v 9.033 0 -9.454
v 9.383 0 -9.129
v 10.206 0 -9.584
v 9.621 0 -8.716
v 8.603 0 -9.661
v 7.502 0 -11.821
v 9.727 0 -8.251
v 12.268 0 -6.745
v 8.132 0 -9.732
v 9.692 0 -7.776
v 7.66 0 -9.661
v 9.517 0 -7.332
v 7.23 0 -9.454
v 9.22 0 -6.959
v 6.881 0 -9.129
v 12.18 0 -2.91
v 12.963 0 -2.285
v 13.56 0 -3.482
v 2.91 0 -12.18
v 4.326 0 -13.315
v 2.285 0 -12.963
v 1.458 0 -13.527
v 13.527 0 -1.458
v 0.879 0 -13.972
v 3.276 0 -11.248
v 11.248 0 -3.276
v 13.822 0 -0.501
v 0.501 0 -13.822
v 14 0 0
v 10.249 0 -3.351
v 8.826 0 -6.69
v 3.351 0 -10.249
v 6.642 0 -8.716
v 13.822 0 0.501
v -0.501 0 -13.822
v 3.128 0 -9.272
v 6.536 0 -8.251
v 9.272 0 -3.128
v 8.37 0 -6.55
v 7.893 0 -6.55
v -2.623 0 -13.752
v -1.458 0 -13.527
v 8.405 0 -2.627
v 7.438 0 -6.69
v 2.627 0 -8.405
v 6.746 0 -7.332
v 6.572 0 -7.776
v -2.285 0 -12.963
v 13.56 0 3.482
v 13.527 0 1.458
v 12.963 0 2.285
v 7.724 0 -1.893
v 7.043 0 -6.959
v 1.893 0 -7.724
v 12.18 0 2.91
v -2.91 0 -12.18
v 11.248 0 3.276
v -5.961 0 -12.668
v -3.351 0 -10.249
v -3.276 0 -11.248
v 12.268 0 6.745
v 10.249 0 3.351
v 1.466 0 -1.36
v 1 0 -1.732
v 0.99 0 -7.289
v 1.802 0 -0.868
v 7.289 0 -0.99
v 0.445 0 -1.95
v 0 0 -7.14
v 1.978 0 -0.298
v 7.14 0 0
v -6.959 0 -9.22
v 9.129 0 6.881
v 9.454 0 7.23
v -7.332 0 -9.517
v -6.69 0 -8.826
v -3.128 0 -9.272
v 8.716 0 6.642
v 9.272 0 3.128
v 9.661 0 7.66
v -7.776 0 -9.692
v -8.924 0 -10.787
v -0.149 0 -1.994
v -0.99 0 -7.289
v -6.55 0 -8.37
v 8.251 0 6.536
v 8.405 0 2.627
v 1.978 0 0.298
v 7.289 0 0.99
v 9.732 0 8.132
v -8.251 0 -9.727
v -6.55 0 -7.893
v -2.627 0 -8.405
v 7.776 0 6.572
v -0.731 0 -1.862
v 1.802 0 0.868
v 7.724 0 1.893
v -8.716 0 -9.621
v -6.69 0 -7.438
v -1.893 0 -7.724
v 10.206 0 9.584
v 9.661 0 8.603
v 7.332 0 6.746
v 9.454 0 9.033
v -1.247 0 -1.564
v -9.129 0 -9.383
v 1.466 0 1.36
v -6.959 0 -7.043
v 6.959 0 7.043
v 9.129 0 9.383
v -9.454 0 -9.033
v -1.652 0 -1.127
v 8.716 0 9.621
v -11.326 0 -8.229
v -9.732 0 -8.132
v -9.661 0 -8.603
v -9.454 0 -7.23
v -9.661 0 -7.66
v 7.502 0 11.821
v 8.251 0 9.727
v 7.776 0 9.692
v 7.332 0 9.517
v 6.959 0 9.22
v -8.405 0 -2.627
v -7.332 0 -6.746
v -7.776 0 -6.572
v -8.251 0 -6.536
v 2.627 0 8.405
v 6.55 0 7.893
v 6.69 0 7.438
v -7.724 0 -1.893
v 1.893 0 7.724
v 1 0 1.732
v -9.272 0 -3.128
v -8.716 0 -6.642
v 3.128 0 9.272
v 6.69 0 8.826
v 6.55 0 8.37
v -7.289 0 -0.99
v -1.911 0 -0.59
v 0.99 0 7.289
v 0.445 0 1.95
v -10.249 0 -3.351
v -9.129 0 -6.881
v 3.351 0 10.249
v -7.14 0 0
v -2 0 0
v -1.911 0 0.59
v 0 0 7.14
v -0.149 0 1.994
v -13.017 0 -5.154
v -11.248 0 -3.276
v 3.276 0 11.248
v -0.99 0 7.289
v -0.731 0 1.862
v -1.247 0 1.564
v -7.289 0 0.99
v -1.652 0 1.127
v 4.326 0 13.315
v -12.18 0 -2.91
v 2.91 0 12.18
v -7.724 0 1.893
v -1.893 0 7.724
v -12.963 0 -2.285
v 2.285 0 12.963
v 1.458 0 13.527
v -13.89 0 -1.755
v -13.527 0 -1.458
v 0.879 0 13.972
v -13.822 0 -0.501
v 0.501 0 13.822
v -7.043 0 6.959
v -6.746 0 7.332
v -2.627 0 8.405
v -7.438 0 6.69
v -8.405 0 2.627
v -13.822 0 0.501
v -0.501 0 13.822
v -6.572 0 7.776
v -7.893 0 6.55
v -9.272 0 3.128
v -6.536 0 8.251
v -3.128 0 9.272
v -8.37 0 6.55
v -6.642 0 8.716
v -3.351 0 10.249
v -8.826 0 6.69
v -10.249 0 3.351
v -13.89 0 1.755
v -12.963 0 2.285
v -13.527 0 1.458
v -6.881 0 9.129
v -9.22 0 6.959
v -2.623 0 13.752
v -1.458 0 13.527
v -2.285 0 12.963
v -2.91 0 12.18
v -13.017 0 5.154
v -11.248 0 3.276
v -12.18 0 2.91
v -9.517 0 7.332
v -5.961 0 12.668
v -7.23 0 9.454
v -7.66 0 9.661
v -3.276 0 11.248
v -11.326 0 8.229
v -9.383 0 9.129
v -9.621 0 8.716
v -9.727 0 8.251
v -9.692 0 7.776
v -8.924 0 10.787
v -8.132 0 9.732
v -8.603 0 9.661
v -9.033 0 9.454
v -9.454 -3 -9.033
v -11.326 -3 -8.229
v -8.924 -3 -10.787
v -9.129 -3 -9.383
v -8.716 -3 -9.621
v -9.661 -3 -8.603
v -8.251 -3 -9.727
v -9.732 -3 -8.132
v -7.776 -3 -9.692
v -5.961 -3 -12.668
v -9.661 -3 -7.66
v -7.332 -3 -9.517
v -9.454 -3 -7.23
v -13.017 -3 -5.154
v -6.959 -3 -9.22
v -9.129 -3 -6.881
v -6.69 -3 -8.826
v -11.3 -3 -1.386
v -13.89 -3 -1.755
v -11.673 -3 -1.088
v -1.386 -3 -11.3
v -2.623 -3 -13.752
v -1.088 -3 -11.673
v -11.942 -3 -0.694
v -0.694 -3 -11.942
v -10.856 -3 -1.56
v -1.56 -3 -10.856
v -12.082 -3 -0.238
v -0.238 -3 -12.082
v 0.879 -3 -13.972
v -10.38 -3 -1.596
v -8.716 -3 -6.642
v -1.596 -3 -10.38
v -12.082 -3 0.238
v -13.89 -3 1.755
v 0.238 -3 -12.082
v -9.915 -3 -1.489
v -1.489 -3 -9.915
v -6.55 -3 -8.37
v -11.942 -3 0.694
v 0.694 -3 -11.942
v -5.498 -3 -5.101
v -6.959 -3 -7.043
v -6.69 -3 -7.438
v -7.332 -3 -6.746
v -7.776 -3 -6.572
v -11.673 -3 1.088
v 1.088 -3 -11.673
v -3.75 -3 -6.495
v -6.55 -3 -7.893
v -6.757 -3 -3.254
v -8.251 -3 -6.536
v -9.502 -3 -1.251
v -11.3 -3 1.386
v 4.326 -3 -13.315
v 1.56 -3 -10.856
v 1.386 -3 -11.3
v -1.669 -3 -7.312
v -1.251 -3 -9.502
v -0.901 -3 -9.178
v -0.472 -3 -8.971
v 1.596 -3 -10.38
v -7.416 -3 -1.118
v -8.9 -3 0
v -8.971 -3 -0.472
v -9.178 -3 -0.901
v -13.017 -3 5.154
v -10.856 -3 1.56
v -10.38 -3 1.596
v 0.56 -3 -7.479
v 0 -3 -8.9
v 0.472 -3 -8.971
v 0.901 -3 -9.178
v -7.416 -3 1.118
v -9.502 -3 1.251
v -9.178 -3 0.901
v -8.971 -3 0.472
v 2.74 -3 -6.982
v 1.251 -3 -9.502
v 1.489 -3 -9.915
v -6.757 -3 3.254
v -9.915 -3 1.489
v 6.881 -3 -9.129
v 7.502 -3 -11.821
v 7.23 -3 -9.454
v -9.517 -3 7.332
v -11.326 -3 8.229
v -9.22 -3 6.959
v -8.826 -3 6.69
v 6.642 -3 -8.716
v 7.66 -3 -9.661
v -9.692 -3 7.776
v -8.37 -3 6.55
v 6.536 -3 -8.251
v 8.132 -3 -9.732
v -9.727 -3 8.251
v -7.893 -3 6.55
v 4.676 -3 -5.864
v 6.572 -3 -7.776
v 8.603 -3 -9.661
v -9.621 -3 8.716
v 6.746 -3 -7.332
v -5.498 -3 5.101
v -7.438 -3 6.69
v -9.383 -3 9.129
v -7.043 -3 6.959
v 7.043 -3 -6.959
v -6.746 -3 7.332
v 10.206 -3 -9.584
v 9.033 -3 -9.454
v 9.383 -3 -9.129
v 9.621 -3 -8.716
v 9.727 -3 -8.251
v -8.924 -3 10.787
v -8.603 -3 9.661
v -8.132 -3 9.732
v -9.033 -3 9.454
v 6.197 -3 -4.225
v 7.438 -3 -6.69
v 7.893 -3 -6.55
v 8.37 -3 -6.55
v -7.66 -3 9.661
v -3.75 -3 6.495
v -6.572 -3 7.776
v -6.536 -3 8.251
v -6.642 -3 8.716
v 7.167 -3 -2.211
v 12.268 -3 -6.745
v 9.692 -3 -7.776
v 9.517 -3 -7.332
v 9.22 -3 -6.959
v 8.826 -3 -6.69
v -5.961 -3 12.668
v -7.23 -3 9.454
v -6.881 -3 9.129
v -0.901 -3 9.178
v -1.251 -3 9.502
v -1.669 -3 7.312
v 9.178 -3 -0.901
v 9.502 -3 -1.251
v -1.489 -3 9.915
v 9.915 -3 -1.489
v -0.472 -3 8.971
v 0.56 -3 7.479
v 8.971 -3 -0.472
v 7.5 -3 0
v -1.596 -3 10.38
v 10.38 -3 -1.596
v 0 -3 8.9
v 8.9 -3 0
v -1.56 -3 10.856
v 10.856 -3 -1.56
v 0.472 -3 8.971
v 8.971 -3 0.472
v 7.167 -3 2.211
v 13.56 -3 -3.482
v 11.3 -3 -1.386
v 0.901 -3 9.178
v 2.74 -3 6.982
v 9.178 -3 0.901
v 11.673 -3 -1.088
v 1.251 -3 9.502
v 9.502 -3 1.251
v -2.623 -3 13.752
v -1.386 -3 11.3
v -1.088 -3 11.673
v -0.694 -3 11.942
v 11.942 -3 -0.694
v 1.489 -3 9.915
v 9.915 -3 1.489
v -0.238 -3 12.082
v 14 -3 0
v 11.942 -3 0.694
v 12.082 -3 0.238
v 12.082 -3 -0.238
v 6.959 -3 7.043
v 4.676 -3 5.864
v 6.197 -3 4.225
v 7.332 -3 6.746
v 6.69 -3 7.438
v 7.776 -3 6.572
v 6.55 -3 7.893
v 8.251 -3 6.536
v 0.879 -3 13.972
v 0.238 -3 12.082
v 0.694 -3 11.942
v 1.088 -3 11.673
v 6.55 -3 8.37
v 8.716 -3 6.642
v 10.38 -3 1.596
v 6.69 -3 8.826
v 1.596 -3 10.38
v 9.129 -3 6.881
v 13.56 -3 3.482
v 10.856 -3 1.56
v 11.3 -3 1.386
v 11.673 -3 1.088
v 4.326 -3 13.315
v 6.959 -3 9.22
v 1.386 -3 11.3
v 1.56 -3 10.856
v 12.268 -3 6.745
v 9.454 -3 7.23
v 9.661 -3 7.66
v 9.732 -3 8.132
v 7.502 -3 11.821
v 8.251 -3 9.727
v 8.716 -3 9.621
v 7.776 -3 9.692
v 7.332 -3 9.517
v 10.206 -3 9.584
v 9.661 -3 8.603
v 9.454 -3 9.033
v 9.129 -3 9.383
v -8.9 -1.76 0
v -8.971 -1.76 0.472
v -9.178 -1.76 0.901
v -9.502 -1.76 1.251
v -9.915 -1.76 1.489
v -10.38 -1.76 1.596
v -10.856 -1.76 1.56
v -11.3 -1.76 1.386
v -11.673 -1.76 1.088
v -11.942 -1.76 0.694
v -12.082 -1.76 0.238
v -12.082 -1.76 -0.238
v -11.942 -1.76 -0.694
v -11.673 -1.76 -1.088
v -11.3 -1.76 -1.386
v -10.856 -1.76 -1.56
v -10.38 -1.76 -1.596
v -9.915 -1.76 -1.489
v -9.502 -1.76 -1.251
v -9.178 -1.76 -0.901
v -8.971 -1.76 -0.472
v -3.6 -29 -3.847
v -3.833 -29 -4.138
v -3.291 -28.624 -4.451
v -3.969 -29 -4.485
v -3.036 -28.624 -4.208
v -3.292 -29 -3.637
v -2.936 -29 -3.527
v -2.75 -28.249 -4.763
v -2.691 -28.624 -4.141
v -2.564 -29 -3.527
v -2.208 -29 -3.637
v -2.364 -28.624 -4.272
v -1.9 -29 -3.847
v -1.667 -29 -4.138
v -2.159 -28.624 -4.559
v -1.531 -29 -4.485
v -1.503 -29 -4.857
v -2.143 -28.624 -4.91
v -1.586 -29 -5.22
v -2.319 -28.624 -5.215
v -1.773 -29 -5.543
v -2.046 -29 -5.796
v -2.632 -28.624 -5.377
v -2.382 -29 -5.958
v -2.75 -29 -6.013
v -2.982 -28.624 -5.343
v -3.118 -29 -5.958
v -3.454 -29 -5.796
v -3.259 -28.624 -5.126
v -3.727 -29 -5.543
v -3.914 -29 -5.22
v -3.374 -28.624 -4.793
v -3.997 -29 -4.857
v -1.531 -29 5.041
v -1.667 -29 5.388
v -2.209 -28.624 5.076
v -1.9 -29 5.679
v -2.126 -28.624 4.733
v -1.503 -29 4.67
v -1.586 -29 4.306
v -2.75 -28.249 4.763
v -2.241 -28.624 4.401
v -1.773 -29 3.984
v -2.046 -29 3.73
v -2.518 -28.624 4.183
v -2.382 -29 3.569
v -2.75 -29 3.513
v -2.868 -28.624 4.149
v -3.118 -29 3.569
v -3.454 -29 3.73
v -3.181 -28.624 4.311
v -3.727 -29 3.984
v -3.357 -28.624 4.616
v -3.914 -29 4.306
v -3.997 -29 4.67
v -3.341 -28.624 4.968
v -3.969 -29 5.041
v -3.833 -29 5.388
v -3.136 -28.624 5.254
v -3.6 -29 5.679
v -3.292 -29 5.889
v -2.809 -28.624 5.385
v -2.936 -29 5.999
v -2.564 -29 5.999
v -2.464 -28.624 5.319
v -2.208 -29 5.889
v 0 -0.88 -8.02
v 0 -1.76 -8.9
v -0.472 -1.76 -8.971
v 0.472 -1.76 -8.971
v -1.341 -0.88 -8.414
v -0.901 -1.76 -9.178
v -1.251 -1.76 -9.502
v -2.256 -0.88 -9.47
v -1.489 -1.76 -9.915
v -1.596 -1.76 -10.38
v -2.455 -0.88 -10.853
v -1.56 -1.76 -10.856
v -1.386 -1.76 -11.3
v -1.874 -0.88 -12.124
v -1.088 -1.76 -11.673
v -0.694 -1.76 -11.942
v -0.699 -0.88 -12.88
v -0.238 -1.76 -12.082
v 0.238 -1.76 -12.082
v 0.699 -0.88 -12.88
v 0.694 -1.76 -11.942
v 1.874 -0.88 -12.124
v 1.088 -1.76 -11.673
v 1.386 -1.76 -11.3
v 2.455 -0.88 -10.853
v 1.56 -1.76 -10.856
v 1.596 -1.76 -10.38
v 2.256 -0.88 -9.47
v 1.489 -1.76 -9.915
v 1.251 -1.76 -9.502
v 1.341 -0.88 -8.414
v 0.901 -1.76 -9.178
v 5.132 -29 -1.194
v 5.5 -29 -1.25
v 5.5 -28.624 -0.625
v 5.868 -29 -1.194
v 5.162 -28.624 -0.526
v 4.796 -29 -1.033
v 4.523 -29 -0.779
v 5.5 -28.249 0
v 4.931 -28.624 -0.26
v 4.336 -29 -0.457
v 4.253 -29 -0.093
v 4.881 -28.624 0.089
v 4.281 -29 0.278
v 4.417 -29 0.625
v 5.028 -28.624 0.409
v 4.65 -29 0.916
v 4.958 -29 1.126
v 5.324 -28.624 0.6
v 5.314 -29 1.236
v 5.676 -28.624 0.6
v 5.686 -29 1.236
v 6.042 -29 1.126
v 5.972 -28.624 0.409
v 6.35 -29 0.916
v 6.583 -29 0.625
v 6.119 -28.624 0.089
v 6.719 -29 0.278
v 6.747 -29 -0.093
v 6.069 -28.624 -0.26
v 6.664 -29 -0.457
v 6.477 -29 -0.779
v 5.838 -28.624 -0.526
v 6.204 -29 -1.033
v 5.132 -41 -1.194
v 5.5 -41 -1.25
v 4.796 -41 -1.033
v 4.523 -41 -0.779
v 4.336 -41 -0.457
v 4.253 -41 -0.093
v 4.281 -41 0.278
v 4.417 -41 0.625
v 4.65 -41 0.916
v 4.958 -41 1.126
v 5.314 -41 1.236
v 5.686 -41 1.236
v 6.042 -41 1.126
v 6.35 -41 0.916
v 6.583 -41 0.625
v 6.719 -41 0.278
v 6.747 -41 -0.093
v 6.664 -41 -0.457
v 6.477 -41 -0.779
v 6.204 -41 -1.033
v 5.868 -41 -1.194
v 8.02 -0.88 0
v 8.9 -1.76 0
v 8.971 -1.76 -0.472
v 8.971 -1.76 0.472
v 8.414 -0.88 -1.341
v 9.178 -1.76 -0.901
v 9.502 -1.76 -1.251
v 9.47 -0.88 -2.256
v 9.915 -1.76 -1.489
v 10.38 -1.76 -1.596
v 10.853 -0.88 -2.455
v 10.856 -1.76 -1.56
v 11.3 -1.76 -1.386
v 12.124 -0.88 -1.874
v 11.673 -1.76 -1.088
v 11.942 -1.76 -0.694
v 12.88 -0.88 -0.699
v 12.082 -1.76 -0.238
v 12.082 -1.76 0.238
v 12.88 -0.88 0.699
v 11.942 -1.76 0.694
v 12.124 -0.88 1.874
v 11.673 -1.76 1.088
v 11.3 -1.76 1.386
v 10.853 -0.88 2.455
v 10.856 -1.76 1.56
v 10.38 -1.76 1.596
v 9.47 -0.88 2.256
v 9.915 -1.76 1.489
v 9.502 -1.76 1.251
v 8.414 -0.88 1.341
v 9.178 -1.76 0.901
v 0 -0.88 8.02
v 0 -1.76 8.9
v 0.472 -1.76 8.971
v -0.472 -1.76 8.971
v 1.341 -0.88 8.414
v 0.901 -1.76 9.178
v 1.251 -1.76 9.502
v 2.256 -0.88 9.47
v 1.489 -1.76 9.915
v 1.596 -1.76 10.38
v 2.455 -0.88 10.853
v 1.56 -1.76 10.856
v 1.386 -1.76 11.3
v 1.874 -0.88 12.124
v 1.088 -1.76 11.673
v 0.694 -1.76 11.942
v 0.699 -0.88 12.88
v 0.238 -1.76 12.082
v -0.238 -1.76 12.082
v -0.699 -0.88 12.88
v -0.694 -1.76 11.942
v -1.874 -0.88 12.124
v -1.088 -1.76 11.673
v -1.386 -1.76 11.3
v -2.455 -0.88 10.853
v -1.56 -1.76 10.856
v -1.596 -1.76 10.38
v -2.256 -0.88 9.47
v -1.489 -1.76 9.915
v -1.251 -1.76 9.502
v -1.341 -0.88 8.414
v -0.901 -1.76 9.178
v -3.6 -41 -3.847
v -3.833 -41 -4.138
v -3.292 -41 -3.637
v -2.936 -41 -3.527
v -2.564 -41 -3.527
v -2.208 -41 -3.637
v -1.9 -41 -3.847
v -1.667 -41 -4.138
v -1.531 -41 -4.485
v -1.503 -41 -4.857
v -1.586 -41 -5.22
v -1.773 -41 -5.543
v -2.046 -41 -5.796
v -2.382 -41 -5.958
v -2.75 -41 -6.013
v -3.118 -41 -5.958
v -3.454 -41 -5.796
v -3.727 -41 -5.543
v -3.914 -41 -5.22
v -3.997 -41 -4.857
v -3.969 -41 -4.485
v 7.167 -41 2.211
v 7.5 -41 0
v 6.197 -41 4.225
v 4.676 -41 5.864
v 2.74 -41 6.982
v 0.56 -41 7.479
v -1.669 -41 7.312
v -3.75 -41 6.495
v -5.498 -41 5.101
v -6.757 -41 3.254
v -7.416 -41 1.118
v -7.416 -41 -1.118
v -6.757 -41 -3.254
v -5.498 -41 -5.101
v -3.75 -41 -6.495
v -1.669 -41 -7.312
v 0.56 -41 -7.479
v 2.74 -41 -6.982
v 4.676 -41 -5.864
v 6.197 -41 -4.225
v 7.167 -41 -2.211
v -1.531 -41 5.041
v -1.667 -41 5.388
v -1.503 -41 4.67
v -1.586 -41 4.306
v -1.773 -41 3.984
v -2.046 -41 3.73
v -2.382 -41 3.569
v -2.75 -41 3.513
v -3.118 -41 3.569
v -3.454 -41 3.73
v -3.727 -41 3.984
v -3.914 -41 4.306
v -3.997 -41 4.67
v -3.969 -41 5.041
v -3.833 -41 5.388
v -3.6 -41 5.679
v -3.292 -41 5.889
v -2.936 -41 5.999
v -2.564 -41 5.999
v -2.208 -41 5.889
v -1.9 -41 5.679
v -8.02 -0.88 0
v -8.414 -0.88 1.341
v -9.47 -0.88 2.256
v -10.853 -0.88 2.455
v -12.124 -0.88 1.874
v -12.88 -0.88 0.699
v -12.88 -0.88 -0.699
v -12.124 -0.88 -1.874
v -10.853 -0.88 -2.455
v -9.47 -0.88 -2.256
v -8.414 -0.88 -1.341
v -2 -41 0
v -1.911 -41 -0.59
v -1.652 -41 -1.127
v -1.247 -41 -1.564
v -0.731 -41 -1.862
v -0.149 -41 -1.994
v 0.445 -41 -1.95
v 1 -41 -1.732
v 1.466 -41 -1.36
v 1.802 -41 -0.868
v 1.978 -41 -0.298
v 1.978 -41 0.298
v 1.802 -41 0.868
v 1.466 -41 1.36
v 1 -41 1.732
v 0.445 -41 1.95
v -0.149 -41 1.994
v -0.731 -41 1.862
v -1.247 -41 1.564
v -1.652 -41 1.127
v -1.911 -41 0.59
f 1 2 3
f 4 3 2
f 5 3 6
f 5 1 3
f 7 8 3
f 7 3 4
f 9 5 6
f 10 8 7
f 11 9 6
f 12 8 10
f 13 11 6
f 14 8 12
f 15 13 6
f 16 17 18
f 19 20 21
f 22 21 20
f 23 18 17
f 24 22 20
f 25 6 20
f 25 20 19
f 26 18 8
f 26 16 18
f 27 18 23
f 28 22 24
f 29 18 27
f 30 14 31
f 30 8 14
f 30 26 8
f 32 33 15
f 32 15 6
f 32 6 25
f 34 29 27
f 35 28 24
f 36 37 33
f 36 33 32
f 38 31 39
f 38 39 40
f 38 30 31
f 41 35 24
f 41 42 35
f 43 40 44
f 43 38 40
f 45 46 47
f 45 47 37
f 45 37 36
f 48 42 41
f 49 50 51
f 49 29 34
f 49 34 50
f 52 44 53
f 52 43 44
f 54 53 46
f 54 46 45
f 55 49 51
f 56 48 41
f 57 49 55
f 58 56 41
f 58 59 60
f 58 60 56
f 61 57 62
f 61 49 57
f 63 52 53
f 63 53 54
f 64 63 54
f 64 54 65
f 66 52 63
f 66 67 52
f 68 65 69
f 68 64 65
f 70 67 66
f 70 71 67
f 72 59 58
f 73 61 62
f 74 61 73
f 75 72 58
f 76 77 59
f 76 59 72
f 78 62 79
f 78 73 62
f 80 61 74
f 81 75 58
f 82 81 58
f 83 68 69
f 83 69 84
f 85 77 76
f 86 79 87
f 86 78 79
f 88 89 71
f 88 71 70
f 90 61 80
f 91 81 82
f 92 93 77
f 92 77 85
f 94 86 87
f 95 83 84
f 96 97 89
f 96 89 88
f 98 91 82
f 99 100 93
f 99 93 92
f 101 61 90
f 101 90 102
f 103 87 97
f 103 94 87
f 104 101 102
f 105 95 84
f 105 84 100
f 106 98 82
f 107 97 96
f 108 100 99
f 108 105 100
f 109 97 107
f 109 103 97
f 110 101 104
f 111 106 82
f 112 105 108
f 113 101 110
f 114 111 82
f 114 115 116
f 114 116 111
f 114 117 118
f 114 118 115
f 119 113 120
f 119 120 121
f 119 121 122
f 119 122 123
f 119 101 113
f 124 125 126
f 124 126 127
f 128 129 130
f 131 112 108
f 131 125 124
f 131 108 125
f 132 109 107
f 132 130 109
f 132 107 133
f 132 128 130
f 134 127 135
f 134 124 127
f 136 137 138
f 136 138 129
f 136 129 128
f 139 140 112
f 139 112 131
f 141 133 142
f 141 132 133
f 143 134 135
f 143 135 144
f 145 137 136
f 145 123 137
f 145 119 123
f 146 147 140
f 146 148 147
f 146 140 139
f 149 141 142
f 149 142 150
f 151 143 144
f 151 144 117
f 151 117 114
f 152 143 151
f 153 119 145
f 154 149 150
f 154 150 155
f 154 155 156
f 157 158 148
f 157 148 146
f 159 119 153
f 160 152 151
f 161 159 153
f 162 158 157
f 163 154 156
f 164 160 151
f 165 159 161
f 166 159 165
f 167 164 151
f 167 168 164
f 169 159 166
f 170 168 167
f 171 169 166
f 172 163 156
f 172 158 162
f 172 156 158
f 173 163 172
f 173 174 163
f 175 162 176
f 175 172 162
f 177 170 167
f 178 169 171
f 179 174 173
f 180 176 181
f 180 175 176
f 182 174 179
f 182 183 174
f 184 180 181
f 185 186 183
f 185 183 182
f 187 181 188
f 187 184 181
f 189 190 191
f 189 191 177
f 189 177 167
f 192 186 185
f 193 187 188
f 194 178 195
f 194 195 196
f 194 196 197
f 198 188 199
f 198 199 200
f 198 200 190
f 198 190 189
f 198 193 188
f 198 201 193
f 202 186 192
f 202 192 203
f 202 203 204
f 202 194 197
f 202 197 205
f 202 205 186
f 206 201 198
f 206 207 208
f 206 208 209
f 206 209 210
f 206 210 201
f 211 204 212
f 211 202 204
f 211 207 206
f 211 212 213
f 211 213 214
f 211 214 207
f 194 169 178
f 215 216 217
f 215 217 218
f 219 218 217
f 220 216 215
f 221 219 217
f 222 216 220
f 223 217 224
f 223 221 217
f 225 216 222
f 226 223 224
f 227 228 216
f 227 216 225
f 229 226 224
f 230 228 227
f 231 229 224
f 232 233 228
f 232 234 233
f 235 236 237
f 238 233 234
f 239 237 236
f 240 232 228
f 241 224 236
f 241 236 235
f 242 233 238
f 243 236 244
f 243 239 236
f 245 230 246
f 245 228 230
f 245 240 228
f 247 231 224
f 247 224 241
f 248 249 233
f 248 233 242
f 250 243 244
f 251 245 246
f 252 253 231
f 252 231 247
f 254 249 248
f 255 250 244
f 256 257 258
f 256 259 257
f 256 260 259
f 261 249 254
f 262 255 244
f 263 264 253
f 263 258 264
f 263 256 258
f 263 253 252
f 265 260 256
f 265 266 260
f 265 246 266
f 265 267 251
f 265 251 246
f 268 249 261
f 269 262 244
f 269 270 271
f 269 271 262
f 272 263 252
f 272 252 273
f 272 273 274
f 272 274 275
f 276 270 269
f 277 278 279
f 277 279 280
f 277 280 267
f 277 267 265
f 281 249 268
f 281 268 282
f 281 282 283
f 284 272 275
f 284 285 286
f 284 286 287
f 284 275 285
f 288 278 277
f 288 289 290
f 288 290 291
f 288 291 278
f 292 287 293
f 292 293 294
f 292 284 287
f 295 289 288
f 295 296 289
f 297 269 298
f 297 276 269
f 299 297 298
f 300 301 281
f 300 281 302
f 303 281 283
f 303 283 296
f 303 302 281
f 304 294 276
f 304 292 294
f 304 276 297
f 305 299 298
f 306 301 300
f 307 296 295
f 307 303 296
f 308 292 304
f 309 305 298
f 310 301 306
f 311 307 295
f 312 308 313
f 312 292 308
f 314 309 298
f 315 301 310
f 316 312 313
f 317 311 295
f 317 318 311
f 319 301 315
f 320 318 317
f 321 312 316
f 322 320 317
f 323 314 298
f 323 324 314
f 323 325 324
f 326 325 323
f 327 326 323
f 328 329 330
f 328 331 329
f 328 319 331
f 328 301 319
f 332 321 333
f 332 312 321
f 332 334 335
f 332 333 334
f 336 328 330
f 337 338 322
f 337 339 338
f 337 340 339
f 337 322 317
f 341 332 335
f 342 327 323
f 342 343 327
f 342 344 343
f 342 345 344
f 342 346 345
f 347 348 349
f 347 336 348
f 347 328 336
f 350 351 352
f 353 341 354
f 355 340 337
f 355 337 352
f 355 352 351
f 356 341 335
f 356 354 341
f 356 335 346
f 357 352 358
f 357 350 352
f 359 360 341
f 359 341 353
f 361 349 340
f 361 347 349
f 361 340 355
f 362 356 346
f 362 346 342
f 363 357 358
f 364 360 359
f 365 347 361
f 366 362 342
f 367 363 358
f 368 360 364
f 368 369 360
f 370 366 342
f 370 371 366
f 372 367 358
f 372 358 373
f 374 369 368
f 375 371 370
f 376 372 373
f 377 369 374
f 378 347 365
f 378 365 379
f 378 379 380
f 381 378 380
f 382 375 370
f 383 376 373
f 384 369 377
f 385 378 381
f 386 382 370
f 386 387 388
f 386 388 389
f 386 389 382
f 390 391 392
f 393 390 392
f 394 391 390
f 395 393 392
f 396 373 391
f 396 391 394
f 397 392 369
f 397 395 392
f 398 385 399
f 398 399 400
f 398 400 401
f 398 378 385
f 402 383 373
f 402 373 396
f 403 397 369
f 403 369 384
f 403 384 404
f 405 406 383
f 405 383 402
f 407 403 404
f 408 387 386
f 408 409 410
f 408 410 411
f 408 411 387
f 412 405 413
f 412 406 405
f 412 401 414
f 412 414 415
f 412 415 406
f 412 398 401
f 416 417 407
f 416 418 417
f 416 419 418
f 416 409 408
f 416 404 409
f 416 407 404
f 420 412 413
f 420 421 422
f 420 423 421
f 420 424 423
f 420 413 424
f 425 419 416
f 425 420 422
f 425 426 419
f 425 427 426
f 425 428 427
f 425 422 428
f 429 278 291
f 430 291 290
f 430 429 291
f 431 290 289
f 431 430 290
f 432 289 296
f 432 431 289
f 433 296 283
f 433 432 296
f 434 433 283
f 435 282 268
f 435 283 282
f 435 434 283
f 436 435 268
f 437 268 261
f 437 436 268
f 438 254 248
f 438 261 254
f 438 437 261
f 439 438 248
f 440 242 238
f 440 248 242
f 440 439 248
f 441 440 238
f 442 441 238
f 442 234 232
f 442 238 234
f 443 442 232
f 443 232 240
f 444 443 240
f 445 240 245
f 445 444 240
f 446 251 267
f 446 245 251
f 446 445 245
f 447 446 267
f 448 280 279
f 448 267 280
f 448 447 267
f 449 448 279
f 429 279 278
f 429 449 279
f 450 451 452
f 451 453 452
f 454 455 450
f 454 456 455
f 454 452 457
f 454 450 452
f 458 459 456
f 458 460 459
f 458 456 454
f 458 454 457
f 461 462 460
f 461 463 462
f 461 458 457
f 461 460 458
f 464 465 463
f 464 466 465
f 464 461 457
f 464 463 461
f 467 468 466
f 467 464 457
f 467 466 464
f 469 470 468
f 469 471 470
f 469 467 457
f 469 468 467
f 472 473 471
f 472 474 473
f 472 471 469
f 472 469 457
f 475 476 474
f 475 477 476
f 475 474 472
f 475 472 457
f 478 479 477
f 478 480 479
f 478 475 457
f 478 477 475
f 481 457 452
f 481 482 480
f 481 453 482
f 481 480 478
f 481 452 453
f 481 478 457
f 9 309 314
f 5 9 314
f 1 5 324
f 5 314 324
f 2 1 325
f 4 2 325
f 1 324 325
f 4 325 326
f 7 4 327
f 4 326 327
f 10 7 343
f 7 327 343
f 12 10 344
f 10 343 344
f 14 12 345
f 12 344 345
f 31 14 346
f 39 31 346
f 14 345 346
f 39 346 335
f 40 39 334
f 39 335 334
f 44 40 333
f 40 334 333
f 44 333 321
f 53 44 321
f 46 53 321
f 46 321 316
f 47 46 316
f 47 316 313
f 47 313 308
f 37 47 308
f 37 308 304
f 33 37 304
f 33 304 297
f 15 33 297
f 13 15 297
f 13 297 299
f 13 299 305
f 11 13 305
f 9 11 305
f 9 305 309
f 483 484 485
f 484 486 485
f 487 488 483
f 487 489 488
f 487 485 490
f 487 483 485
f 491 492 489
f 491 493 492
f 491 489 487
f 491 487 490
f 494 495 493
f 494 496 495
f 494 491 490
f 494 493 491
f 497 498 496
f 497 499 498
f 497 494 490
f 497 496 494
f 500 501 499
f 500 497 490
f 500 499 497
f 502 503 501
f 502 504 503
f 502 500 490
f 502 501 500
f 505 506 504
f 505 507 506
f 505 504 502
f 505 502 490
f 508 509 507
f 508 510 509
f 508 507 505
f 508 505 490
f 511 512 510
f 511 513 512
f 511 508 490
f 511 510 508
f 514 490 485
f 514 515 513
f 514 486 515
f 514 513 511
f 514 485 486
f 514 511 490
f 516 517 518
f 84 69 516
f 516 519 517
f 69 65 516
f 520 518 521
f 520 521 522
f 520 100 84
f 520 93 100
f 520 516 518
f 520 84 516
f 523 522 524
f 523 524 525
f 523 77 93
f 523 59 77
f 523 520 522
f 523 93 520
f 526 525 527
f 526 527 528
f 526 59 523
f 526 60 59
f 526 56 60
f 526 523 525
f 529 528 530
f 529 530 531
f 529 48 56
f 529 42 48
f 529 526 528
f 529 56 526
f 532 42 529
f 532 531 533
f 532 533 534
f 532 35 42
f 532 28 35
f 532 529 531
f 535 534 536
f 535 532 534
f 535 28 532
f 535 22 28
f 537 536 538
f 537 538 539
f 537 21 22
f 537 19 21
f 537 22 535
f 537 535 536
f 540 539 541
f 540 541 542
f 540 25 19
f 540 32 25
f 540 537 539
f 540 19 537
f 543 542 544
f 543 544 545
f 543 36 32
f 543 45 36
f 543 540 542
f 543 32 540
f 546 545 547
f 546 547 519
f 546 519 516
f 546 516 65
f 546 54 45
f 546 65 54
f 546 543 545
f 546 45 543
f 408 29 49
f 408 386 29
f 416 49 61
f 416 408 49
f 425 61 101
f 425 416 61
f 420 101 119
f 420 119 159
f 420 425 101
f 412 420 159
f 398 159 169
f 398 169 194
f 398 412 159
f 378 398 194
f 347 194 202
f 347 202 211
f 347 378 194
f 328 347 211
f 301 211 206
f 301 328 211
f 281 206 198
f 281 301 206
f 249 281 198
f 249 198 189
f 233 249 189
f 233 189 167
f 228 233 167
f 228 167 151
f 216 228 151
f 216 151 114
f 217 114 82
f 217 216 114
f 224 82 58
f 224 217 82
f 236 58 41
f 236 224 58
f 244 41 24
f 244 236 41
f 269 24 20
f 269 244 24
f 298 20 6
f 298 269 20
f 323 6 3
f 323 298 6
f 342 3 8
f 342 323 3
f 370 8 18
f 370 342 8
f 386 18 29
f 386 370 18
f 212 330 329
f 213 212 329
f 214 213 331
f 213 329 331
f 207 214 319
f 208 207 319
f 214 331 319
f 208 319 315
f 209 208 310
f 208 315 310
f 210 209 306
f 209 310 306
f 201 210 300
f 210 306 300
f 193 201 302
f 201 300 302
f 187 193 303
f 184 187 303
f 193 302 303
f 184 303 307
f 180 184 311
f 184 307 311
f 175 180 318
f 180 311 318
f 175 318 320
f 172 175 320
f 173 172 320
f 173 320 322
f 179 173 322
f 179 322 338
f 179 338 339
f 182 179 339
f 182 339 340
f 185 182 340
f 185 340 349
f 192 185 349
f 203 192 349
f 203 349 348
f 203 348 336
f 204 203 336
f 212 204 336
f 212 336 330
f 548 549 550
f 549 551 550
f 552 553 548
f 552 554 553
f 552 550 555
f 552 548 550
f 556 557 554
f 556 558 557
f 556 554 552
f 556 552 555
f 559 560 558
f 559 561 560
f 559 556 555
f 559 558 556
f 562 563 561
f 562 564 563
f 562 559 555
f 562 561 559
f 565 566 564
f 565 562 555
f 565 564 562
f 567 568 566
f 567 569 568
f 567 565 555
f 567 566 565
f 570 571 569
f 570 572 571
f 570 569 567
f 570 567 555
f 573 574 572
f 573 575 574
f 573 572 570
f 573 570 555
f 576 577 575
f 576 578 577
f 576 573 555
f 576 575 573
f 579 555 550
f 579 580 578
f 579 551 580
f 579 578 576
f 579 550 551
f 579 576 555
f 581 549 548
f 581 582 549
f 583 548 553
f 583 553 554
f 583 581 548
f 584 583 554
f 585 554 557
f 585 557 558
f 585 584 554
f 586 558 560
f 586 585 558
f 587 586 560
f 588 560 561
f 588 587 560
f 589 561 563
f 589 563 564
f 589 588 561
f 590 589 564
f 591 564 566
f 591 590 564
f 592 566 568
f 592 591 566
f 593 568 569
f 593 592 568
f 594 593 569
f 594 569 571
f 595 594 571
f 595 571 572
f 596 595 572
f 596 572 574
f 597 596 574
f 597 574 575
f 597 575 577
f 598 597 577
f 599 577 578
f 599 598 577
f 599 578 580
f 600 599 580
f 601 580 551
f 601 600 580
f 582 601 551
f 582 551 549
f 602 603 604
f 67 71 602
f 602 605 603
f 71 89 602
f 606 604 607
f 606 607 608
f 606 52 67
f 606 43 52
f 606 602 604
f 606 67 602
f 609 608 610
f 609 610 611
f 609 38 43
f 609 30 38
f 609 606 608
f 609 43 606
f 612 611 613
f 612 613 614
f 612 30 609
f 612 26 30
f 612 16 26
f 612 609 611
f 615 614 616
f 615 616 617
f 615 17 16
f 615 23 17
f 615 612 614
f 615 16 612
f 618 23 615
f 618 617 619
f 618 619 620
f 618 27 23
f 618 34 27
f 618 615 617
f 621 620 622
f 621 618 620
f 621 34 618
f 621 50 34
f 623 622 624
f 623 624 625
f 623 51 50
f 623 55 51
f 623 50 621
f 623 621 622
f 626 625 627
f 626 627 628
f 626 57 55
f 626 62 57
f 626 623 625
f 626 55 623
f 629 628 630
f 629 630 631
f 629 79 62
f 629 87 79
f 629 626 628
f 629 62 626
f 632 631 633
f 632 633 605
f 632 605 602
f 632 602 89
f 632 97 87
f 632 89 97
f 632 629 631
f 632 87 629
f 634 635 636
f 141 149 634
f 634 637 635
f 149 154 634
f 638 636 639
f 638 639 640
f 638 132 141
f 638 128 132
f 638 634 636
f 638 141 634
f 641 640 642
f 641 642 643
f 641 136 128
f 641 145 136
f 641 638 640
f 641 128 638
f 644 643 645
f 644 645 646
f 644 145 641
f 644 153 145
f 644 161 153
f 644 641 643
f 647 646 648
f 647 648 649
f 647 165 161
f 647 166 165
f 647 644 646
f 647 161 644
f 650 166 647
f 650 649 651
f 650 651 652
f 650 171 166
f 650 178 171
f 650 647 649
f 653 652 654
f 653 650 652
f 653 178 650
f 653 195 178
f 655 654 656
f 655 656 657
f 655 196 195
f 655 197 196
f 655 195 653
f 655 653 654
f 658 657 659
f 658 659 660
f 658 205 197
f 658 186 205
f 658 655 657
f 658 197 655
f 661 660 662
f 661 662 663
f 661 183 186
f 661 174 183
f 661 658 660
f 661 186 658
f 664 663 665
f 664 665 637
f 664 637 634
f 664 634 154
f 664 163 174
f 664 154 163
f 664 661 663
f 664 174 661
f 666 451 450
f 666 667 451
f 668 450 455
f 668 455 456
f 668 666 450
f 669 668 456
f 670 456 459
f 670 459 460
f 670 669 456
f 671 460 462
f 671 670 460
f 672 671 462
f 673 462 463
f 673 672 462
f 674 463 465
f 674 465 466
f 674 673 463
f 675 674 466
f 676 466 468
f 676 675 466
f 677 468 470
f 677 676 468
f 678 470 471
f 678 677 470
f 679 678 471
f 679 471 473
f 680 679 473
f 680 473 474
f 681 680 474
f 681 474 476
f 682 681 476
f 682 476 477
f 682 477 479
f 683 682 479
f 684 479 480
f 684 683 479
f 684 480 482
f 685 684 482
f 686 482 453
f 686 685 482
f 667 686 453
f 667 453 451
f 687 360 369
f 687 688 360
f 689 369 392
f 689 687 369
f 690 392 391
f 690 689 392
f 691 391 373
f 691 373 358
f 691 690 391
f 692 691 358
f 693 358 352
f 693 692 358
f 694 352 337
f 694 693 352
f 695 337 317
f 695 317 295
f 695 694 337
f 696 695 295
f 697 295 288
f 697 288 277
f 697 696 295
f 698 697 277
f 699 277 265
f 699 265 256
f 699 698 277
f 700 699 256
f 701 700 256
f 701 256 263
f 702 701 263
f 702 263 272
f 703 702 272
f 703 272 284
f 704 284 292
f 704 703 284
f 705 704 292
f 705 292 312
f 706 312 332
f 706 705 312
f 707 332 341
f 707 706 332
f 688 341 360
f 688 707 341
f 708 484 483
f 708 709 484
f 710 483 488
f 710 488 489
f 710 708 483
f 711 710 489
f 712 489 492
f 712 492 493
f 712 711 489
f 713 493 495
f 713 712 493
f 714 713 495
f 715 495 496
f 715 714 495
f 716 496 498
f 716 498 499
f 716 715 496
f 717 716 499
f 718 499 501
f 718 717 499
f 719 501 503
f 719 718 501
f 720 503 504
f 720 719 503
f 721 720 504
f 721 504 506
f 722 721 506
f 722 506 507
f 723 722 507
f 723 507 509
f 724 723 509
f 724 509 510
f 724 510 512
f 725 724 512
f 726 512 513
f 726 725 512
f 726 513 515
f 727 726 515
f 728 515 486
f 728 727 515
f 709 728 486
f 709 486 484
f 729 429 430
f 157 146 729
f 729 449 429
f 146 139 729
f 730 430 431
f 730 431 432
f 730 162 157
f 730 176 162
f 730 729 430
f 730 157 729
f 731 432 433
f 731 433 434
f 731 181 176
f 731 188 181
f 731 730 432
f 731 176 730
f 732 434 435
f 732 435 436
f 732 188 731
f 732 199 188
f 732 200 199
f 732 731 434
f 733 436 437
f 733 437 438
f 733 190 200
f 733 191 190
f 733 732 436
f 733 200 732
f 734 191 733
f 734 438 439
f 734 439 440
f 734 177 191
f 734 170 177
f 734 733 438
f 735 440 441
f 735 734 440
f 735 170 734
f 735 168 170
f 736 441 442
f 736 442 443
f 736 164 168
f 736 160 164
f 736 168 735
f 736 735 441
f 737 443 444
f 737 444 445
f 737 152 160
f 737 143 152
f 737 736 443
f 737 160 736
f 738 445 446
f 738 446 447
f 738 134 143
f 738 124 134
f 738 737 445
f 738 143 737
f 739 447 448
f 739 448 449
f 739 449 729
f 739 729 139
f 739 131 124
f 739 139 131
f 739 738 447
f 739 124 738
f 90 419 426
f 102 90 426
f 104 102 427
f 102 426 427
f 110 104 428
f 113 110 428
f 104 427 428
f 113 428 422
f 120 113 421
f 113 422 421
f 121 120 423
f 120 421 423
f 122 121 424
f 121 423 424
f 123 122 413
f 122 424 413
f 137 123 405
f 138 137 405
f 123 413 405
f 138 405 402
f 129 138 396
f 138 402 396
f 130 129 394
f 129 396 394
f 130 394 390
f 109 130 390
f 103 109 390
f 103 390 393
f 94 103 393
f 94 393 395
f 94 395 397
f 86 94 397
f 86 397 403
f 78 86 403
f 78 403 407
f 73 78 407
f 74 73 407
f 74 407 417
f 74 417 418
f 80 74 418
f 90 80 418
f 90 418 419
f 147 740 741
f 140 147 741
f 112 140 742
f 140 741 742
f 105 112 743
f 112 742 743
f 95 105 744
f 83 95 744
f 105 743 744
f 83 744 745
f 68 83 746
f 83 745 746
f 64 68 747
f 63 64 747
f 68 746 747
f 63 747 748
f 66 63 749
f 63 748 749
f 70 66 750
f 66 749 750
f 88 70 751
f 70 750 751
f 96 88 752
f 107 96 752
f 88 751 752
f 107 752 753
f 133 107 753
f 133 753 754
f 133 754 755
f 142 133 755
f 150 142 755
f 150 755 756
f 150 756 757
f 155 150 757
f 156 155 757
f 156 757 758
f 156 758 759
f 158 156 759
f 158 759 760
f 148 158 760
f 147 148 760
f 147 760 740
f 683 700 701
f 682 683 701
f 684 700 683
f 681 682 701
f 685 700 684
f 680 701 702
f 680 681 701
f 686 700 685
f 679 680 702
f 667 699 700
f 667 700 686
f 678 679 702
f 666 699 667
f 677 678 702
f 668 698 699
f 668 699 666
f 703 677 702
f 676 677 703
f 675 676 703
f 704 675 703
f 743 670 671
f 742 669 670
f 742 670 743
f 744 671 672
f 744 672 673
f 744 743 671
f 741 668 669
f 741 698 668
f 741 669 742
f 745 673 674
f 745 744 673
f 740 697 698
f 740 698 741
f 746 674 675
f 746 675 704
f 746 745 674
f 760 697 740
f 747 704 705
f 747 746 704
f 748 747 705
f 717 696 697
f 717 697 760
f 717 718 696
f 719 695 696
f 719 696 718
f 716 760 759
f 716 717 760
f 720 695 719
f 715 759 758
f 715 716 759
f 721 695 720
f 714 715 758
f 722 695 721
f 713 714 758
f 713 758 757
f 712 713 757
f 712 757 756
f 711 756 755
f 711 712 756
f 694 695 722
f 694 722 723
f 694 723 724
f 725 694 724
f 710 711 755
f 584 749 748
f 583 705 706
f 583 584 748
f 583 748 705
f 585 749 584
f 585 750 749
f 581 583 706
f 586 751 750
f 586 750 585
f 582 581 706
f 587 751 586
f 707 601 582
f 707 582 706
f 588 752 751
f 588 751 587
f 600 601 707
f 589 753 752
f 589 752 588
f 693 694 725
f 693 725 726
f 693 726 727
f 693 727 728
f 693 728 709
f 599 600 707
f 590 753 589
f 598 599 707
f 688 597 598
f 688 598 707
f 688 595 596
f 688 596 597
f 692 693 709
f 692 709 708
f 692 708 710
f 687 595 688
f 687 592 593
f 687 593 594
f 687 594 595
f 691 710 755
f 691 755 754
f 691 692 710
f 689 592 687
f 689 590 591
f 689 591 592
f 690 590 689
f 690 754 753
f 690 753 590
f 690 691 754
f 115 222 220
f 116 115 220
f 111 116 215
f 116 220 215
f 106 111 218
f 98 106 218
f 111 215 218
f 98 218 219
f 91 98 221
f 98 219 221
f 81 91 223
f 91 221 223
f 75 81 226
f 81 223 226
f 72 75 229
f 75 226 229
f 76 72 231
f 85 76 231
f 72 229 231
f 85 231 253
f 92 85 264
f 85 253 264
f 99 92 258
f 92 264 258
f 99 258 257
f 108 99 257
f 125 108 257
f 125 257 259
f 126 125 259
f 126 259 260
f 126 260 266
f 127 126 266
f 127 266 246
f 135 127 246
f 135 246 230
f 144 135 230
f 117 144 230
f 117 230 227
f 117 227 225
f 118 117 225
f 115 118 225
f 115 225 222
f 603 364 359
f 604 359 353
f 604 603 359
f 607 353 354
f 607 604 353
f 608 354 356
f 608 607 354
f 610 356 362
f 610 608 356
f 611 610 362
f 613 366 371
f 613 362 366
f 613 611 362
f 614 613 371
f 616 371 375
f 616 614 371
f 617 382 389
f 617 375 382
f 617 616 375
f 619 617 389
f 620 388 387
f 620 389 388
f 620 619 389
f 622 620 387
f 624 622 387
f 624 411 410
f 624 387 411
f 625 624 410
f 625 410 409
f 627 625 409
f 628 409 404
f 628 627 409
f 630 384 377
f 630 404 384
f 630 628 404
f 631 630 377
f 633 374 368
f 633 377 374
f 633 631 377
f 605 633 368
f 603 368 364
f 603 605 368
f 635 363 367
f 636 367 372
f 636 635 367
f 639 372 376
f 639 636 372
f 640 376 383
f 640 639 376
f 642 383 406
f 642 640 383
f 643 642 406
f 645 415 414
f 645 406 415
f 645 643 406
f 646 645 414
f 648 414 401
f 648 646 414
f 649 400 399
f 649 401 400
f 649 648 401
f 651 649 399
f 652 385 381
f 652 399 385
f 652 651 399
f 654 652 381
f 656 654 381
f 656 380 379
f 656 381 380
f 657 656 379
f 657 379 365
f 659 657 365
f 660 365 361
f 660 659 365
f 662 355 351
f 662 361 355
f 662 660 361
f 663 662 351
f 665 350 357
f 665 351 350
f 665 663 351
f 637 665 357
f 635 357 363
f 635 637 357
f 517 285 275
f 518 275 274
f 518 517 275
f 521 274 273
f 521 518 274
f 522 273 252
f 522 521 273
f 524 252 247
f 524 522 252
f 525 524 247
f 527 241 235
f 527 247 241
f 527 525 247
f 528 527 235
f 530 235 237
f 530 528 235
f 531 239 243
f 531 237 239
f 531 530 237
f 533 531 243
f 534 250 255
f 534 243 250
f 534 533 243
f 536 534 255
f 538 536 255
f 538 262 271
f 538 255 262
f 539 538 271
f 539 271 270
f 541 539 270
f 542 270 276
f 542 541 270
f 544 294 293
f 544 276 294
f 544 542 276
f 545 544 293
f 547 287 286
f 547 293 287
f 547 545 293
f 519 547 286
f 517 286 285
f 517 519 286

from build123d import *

# Parameters (mm, degrees)
F_4_0_4_DURCHMESSER_BOHRUNG1_D       = 4
F_4_0_4_DURCHMESSER_BOHRUNG1_DEPTH   = 41
KREISMUSTER1_COUNT                   = 3
KREISMUSTER2_COUNT                   = 4
F_3_2_3_2_DURCHMESSER_BOHRUNG1_D     = 3.2
F_3_2_3_2_DURCHMESSER_BOHRUNG1_DEPTH = 3.001
KREISMUSTER3_COUNT                   = 4


with BuildPart() as part:
    # Skizze1 → Rotation1 (revolve)
    with BuildSketch(Plane.XY):
        Polygon((0, 0), (14, 0), (14, -3), (7.5, -3), (7.5, -41), (0, -41), align=None)
    revolve(axis=Axis((0, 9.414893617, 0), (0, -1, 0)))

    # Ø4.0 (4) Durchmesser Bohrung1
    with Locations(Plane(origin=(0, 0, 0), x_dir=(1, 0, 0), z_dir=(0, 1, 0))):
        with Locations((0, 0)):
            Hole(F_4_0_4_DURCHMESSER_BOHRUNG1_D / 2, depth=F_4_0_4_DURCHMESSER_BOHRUNG1_DEPTH)

    # Skizze4 → M3 Gewindebohrung1 (revolve, cut)
    with BuildSketch(Plane(origin=(5.5, -41, 0), x_dir=(0, 0, -1), z_dir=(1, 0, 0))):
        Polygon((0, 0), (0, 12.751075774), (1.25, 12), (1.25, 0), align=None)
    m3_gewindebohrung1 = revolve(axis=Axis((5.5, -47.35, 0), (0, 1, 0)), mode=Mode.SUBTRACT)

    # Kreismuster1: M3 Gewindebohrung1 ×3 about axis
    kreismuster1_axis = Axis((0, 0, 0), (0, 1, 0))
    for i in range(1, KREISMUSTER1_COUNT):
        add(m3_gewindebohrung1.rotate(kreismuster1_axis, i * 360 / KREISMUSTER1_COUNT), mode=Mode.SUBTRACT)

    # Skizze6 → Formsenkung für M3 Senkschraube mit Innensechskant1 (revolve, cut)
    with BuildSketch(Plane(origin=(0, 0, -10.5), x_dir=(0, 0, 1), z_dir=(1, 0, 0))):
        Polygon((0, 0), (0, 3.001), (1.6, 3.001), (1.6, 1.76), (3.36, 0), align=None)
    formsenkung_f_r_m3_senkschraube_mit_inne = revolve(axis=Axis((0, 6.35, -10.5), (0, -1, 0)), mode=Mode.SUBTRACT)

    # Kreismuster2: Formsenkung für M3 Senkschraube mit Innensechskant1 ×4 about axis
    kreismuster2_axis = Axis((0, 0, 0), (0, 1, 0))
    for i in range(1, KREISMUSTER2_COUNT):
        add(formsenkung_f_r_m3_senkschraube_mit_inne.rotate(kreismuster2_axis, i * 360 / KREISMUSTER2_COUNT), mode=Mode.SUBTRACT)

    # Ø3.2 (3.2) Durchmesser Bohrung1
    with Locations(Plane(origin=(0, 0, 0), x_dir=(1, 0, 0), z_dir=(0, 1, 0))):
        with Locations((-8.131727984, 8.131727984)):
            f_3_2_3_2_durchmesser_bohrung1 = Hole(F_3_2_3_2_DURCHMESSER_BOHRUNG1_D / 2, depth=F_3_2_3_2_DURCHMESSER_BOHRUNG1_DEPTH)

    # Kreismuster3: Ø3.2 (3.2) Durchmesser Bohrung1 ×4 about axis
    kreismuster3_axis = Axis((0, 0, 0), (0, 1, 0))
    for i in range(1, KREISMUSTER3_COUNT):
        add(f_3_2_3_2_durchmesser_bohrung1.rotate(kreismuster3_axis, i * 360 / KREISMUSTER3_COUNT), mode=Mode.SUBTRACT)


solid = part.part
